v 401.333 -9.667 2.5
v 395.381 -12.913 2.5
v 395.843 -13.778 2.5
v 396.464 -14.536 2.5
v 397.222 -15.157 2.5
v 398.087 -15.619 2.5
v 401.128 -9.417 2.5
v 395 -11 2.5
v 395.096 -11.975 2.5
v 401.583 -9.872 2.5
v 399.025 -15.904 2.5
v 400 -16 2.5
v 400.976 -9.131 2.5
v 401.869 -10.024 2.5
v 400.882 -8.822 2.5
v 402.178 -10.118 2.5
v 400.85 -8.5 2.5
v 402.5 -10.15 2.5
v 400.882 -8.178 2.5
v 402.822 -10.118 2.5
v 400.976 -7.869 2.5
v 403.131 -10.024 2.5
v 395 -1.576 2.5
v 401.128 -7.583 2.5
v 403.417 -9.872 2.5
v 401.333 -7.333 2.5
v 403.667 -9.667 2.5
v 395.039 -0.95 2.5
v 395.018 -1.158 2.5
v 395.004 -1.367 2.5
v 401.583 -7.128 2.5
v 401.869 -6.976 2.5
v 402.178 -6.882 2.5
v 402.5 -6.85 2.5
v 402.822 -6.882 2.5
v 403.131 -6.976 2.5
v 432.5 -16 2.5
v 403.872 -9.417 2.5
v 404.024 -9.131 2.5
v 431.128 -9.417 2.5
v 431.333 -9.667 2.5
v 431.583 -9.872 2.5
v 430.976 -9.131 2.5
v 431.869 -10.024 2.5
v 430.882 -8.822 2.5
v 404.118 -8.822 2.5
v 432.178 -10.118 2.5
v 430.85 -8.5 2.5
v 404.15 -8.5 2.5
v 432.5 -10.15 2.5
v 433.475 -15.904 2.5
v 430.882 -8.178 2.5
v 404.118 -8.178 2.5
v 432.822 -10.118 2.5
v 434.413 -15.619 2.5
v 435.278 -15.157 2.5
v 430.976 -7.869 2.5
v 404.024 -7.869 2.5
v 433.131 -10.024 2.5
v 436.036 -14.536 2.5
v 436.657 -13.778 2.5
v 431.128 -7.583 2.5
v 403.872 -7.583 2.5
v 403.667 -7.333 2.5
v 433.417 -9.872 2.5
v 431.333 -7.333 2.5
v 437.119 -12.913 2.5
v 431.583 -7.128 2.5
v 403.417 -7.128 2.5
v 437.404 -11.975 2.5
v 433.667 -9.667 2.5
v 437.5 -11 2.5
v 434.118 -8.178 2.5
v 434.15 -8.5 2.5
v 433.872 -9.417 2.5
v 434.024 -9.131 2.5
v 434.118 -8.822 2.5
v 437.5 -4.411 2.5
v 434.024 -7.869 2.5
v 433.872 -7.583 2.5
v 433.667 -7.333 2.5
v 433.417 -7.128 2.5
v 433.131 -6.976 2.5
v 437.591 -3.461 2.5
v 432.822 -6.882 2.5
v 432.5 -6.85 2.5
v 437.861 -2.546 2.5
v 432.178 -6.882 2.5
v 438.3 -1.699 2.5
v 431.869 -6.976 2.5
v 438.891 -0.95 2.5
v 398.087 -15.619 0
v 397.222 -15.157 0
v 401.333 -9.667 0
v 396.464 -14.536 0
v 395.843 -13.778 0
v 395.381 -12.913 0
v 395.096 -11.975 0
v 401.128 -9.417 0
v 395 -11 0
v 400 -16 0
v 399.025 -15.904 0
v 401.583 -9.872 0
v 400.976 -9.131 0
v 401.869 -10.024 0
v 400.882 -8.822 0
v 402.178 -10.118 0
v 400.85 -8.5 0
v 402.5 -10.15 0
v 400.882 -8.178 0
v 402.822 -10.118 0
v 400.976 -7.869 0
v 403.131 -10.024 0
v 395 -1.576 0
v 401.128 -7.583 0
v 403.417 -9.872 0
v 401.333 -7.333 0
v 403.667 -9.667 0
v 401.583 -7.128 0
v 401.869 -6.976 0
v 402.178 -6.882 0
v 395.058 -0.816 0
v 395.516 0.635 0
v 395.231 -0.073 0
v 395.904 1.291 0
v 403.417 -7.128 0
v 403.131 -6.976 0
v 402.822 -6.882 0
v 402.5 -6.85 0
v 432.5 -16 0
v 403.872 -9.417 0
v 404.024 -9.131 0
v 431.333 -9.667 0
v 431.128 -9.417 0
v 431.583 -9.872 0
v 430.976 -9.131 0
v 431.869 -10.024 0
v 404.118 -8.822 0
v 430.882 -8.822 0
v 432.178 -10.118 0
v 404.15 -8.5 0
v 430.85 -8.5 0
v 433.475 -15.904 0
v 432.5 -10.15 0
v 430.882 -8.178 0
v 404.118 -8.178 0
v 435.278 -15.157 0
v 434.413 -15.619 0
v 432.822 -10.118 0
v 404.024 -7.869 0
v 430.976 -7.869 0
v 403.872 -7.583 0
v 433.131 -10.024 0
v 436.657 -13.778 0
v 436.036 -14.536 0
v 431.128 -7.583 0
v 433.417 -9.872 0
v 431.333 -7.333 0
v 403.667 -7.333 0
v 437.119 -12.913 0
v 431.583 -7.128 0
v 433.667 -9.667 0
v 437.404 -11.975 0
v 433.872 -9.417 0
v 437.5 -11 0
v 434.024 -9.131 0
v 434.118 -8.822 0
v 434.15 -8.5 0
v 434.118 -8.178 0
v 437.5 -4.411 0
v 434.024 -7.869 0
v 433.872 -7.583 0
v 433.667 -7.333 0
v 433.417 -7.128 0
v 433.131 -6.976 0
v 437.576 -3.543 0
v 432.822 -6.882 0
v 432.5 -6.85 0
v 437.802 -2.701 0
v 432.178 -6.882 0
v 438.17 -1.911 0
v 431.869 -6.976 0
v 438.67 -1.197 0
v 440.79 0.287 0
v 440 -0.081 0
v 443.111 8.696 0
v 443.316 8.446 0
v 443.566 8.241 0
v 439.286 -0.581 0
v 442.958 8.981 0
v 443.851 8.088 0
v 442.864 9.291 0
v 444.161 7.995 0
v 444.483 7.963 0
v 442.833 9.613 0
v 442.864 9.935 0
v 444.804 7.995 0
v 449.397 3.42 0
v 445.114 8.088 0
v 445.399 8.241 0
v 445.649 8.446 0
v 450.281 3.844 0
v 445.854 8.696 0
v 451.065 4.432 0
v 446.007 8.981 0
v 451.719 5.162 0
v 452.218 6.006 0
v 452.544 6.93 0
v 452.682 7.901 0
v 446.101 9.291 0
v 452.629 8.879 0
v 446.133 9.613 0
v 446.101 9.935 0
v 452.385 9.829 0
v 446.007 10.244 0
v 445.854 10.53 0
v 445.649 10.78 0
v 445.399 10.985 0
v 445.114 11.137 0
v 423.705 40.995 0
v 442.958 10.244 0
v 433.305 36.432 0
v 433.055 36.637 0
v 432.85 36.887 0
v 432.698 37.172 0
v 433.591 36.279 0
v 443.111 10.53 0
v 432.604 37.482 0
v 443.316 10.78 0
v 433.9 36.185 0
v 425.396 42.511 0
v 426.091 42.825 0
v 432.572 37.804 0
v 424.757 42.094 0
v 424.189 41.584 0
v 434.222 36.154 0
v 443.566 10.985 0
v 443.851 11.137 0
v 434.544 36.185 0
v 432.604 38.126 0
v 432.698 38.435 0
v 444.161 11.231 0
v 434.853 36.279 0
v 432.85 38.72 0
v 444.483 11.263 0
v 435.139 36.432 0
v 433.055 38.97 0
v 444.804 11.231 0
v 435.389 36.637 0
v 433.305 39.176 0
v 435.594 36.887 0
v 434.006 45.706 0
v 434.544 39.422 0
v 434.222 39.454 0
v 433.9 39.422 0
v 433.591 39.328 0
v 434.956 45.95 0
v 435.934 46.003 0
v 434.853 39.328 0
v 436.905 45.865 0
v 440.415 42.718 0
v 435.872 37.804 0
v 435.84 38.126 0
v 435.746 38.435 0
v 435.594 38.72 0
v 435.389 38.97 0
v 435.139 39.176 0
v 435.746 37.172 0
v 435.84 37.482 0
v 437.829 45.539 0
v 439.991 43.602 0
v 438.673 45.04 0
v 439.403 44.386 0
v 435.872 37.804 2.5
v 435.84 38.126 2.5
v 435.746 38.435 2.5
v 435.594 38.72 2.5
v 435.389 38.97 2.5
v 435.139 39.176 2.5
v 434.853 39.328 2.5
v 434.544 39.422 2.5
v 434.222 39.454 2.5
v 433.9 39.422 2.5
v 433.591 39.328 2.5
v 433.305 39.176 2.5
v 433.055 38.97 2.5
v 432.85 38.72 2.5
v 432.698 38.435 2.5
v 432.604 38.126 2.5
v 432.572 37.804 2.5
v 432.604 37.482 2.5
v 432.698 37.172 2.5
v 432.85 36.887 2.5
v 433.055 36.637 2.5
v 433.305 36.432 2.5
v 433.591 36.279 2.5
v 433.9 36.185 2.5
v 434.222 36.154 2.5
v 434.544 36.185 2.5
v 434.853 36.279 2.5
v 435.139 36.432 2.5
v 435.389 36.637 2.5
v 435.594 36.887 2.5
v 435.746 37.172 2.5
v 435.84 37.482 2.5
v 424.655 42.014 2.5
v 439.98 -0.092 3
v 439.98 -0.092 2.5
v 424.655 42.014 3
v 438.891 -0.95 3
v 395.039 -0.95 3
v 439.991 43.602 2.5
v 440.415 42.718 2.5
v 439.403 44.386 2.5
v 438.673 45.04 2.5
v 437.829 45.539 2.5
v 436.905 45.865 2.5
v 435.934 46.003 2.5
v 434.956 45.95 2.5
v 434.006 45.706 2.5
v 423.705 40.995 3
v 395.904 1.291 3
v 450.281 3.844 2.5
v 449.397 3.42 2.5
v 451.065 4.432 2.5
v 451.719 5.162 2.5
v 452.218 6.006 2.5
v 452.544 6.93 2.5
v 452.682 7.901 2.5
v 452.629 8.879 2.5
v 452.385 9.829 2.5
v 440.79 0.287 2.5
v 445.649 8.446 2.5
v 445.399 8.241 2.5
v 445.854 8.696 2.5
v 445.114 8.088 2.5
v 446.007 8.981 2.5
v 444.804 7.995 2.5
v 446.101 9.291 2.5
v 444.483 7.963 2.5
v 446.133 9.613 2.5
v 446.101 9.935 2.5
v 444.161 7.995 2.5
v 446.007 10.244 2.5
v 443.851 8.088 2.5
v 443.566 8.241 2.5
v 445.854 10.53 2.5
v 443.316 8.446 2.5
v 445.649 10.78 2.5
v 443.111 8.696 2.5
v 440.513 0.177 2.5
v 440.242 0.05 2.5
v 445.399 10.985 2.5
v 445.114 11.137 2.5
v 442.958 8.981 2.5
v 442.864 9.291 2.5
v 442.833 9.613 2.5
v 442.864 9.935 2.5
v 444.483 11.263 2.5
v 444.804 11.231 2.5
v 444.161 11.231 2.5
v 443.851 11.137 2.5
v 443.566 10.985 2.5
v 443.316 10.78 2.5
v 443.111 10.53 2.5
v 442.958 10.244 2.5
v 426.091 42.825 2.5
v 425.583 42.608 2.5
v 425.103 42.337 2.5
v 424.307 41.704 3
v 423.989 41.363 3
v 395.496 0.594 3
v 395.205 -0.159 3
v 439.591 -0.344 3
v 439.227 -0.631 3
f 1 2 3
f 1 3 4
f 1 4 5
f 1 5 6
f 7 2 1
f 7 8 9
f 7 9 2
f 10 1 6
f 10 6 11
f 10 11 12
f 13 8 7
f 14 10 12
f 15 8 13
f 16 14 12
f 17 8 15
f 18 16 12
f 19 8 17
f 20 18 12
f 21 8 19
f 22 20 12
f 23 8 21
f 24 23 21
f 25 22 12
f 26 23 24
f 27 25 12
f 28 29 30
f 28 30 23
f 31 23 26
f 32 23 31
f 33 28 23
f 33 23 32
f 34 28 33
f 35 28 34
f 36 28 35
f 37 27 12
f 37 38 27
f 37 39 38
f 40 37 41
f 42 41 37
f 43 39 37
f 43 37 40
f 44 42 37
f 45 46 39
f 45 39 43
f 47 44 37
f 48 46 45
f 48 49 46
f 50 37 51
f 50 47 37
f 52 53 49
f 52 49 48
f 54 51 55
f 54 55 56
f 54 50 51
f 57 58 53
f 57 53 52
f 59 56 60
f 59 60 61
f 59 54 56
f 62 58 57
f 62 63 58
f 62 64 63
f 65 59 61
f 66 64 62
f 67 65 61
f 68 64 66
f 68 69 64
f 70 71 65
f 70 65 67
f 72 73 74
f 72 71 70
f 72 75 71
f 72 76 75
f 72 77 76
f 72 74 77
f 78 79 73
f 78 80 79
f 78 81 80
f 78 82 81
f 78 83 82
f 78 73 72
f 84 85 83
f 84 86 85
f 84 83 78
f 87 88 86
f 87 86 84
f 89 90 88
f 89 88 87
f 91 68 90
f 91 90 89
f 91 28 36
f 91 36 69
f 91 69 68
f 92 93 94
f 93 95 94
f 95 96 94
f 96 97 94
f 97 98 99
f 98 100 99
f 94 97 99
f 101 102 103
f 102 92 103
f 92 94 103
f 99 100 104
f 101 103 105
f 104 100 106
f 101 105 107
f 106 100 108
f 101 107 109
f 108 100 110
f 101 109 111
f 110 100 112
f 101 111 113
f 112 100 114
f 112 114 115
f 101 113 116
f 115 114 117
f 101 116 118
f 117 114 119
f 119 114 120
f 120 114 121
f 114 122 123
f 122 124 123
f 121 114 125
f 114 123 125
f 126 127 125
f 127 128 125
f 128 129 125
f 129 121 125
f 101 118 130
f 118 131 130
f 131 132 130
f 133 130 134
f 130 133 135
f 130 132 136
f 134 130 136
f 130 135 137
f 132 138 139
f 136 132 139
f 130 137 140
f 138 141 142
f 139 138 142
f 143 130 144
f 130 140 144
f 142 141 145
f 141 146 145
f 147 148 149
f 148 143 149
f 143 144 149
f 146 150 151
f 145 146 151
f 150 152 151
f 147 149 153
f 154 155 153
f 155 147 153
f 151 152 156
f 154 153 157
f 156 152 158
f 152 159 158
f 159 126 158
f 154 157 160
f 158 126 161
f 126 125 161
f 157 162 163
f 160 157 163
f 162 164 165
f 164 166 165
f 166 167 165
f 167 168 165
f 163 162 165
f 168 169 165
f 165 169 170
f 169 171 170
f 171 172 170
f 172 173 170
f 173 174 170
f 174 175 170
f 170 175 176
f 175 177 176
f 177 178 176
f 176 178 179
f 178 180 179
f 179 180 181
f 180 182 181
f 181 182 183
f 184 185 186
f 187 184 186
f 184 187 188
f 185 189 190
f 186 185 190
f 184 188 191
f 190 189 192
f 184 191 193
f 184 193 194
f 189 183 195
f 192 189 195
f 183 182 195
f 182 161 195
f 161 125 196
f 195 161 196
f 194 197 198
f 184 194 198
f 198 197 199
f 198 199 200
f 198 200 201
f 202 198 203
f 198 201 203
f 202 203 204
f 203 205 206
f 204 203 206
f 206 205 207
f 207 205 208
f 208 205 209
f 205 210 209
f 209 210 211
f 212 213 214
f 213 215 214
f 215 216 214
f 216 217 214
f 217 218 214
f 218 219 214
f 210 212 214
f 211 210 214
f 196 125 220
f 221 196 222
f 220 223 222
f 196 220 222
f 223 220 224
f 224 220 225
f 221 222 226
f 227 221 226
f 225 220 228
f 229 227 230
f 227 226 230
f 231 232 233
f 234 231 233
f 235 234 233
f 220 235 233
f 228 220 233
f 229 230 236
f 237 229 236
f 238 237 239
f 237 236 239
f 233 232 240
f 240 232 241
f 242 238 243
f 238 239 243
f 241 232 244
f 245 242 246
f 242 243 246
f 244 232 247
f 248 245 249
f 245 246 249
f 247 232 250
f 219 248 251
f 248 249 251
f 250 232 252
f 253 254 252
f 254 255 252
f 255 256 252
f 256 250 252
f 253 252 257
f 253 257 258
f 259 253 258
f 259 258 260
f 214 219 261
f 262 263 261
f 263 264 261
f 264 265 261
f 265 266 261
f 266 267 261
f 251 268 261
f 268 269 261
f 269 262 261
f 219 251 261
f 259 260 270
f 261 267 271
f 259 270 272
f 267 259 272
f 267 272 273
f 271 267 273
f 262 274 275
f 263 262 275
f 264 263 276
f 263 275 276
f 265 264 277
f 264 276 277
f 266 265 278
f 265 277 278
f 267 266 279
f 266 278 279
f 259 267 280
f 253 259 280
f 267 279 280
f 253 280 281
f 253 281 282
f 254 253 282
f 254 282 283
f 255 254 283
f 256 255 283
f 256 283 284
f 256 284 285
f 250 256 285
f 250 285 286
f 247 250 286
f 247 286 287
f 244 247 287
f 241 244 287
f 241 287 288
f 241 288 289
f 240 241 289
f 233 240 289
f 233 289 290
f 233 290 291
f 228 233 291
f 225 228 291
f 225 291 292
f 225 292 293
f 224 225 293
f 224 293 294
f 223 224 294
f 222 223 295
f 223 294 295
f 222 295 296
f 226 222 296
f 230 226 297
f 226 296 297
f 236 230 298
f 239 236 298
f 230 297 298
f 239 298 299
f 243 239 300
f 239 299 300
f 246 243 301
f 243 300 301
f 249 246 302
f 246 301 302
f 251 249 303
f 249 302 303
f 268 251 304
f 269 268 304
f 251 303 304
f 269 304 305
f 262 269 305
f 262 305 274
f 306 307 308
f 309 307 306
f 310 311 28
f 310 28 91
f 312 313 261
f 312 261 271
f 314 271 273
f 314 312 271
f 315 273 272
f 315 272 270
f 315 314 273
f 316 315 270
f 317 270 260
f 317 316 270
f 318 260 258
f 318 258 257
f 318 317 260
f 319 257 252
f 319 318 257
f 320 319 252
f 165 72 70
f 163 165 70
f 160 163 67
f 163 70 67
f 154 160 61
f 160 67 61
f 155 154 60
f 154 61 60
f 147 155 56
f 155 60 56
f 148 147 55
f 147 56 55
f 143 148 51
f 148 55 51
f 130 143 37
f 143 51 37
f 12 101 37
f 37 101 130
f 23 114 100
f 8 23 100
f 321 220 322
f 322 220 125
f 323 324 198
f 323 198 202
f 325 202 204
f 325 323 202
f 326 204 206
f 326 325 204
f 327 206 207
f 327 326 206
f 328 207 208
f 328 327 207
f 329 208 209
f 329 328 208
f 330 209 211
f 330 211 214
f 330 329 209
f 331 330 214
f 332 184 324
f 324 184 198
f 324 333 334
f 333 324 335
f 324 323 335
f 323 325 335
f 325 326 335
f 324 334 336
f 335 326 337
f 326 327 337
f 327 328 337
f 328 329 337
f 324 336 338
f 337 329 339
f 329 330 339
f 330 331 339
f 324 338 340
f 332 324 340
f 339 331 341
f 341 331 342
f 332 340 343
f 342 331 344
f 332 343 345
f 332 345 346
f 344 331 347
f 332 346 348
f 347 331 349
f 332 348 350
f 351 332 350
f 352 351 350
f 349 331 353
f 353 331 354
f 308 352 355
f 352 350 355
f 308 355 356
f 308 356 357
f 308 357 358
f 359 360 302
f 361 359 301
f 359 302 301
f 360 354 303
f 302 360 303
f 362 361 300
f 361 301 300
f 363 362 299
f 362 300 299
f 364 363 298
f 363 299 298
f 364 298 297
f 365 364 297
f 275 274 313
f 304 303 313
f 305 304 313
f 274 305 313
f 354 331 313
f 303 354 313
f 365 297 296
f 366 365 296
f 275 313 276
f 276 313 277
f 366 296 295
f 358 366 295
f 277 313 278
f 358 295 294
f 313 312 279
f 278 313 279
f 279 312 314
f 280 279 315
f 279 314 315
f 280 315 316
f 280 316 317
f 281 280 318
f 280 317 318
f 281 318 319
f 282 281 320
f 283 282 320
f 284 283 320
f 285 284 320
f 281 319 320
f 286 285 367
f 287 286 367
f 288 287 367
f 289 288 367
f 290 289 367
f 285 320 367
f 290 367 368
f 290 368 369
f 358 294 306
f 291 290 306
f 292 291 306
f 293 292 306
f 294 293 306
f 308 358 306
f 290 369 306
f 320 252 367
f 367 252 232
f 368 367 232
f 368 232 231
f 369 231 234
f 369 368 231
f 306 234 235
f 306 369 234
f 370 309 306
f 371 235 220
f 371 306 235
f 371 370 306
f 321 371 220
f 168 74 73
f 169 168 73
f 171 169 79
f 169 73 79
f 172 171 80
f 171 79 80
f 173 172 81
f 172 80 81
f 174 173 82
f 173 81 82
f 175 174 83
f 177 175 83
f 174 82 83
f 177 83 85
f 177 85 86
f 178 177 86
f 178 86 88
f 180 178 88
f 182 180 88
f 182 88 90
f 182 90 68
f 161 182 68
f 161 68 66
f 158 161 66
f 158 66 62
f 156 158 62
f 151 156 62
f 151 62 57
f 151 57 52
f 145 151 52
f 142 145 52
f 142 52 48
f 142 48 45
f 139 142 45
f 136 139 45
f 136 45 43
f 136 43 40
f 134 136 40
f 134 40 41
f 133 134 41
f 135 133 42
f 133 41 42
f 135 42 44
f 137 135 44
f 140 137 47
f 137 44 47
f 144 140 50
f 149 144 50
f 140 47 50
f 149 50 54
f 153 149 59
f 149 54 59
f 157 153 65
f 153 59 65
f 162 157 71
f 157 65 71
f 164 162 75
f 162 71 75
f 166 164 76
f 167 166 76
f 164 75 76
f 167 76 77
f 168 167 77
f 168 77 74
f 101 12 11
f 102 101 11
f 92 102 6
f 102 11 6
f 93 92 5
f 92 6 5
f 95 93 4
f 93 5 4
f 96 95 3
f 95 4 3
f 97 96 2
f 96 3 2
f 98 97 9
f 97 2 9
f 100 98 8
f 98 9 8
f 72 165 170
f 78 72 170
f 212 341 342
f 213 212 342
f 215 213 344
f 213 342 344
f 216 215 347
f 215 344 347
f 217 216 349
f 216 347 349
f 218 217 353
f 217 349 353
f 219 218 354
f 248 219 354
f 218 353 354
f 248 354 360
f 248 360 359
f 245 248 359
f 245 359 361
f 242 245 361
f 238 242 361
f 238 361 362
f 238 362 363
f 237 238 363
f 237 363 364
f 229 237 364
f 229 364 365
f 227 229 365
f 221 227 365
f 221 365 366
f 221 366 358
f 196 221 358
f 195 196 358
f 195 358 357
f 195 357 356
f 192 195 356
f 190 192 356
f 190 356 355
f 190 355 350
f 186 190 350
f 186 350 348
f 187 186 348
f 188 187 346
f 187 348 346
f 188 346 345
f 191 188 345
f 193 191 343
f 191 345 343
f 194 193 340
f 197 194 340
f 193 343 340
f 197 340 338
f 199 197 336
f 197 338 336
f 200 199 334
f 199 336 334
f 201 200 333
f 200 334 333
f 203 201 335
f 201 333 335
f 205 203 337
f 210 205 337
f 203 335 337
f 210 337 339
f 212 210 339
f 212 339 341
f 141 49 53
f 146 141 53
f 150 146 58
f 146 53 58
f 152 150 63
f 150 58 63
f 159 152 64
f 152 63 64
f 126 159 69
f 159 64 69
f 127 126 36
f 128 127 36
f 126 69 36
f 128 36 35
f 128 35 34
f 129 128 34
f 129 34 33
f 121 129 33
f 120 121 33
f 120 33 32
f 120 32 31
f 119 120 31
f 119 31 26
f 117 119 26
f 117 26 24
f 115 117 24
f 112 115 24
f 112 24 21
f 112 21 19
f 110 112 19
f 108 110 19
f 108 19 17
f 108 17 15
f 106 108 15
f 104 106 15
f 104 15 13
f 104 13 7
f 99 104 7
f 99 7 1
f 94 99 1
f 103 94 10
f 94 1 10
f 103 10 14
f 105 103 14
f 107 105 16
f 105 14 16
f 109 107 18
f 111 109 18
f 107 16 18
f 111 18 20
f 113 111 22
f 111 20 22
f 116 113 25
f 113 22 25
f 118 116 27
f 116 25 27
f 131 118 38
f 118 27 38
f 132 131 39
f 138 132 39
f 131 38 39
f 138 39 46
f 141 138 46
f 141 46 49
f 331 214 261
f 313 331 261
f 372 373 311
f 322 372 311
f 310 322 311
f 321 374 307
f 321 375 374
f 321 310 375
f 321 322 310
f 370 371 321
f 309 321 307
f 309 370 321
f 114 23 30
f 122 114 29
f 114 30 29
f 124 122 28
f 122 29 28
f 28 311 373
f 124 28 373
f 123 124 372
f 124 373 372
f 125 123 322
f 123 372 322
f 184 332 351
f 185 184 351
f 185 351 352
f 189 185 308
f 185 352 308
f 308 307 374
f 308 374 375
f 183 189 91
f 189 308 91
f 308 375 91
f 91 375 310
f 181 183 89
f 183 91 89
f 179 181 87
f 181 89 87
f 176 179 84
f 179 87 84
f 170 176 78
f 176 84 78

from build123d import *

# Parameters (mm, degrees)
EXTRUDE_1_DEPTH     = 3
SKETCH_2_R          = 1.65
CUT_EXTRUDE_1_DEPTH = 3
FILLET_1_R          = 5
SKETCH_4_W          = 44.5
SKETCH_4_H          = 15.05
CUT_EXTRUDE_2_DEPTH = 0.5


with BuildPart() as part:
    # ｽｹｯﾁ1 → ﾎﾞｽ - 押し出し1 (new body)
    with BuildSketch(Plane.XY):
        Polygon((437.5, -0.909925586), (454.095389312, 5.13030215), (438.704482862, 47.416470085), (424.60909355, 42.286167935), (395, 0), (395, -16), (437.5, -16), align=None)
    extrude(amount=EXTRUDE_1_DEPTH)

    # ｽｹｯﾁ2 → ｶｯﾄ - 押し出し1 (cut)
    with BuildSketch(Plane.XY.offset(3)):
        with Locations((402.5, -8.5)):
            Circle(SKETCH_2_R)
        with Locations((432.5, -8.5)):
            Circle(SKETCH_2_R)
        with Locations((434.221939281, 37.803624354)):
            Circle(SKETCH_2_R)
        with Locations((444.482543581, 9.612845731)):
            Circle(SKETCH_2_R)
    extrude(amount=-CUT_EXTRUDE_1_DEPTH, mode=Mode.SUBTRACT)

    # ﾌｨﾚｯﾄ1
    fillet_1_edges = [part.edges().sort_by_distance(p)[0] for p in [
        (437.5, -16, 1.5),
        (395, -16, 1.5),
        (395, 0, 1.5),
        (424.60909355, 42.286167935, 1.5),
        (438.704482862, 47.416470085, 1.5),
        (454.095389312, 5.13030215, 1.5),
        (437.5, -0.909925586, 1.5),
    ]]
    fillet(fillet_1_edges, radius=FILLET_1_R)

    # ｽｹｯﾁ4 → ｶｯﾄ - 押し出し2 (cut)
    with BuildSketch(Plane.XY.offset(3)):
        Polygon((438.704482862, 47.416470085), (454.437409455, 4.190609529), (440.295035512, -0.956793628), (424.562108919, 42.269066928), align=None)
        with Locations((417.25, -8.475)):
            Rectangle(SKETCH_4_W, SKETCH_4_H)
    extrude(amount=-CUT_EXTRUDE_2_DEPTH, mode=Mode.SUBTRACT)


solid = part.part
